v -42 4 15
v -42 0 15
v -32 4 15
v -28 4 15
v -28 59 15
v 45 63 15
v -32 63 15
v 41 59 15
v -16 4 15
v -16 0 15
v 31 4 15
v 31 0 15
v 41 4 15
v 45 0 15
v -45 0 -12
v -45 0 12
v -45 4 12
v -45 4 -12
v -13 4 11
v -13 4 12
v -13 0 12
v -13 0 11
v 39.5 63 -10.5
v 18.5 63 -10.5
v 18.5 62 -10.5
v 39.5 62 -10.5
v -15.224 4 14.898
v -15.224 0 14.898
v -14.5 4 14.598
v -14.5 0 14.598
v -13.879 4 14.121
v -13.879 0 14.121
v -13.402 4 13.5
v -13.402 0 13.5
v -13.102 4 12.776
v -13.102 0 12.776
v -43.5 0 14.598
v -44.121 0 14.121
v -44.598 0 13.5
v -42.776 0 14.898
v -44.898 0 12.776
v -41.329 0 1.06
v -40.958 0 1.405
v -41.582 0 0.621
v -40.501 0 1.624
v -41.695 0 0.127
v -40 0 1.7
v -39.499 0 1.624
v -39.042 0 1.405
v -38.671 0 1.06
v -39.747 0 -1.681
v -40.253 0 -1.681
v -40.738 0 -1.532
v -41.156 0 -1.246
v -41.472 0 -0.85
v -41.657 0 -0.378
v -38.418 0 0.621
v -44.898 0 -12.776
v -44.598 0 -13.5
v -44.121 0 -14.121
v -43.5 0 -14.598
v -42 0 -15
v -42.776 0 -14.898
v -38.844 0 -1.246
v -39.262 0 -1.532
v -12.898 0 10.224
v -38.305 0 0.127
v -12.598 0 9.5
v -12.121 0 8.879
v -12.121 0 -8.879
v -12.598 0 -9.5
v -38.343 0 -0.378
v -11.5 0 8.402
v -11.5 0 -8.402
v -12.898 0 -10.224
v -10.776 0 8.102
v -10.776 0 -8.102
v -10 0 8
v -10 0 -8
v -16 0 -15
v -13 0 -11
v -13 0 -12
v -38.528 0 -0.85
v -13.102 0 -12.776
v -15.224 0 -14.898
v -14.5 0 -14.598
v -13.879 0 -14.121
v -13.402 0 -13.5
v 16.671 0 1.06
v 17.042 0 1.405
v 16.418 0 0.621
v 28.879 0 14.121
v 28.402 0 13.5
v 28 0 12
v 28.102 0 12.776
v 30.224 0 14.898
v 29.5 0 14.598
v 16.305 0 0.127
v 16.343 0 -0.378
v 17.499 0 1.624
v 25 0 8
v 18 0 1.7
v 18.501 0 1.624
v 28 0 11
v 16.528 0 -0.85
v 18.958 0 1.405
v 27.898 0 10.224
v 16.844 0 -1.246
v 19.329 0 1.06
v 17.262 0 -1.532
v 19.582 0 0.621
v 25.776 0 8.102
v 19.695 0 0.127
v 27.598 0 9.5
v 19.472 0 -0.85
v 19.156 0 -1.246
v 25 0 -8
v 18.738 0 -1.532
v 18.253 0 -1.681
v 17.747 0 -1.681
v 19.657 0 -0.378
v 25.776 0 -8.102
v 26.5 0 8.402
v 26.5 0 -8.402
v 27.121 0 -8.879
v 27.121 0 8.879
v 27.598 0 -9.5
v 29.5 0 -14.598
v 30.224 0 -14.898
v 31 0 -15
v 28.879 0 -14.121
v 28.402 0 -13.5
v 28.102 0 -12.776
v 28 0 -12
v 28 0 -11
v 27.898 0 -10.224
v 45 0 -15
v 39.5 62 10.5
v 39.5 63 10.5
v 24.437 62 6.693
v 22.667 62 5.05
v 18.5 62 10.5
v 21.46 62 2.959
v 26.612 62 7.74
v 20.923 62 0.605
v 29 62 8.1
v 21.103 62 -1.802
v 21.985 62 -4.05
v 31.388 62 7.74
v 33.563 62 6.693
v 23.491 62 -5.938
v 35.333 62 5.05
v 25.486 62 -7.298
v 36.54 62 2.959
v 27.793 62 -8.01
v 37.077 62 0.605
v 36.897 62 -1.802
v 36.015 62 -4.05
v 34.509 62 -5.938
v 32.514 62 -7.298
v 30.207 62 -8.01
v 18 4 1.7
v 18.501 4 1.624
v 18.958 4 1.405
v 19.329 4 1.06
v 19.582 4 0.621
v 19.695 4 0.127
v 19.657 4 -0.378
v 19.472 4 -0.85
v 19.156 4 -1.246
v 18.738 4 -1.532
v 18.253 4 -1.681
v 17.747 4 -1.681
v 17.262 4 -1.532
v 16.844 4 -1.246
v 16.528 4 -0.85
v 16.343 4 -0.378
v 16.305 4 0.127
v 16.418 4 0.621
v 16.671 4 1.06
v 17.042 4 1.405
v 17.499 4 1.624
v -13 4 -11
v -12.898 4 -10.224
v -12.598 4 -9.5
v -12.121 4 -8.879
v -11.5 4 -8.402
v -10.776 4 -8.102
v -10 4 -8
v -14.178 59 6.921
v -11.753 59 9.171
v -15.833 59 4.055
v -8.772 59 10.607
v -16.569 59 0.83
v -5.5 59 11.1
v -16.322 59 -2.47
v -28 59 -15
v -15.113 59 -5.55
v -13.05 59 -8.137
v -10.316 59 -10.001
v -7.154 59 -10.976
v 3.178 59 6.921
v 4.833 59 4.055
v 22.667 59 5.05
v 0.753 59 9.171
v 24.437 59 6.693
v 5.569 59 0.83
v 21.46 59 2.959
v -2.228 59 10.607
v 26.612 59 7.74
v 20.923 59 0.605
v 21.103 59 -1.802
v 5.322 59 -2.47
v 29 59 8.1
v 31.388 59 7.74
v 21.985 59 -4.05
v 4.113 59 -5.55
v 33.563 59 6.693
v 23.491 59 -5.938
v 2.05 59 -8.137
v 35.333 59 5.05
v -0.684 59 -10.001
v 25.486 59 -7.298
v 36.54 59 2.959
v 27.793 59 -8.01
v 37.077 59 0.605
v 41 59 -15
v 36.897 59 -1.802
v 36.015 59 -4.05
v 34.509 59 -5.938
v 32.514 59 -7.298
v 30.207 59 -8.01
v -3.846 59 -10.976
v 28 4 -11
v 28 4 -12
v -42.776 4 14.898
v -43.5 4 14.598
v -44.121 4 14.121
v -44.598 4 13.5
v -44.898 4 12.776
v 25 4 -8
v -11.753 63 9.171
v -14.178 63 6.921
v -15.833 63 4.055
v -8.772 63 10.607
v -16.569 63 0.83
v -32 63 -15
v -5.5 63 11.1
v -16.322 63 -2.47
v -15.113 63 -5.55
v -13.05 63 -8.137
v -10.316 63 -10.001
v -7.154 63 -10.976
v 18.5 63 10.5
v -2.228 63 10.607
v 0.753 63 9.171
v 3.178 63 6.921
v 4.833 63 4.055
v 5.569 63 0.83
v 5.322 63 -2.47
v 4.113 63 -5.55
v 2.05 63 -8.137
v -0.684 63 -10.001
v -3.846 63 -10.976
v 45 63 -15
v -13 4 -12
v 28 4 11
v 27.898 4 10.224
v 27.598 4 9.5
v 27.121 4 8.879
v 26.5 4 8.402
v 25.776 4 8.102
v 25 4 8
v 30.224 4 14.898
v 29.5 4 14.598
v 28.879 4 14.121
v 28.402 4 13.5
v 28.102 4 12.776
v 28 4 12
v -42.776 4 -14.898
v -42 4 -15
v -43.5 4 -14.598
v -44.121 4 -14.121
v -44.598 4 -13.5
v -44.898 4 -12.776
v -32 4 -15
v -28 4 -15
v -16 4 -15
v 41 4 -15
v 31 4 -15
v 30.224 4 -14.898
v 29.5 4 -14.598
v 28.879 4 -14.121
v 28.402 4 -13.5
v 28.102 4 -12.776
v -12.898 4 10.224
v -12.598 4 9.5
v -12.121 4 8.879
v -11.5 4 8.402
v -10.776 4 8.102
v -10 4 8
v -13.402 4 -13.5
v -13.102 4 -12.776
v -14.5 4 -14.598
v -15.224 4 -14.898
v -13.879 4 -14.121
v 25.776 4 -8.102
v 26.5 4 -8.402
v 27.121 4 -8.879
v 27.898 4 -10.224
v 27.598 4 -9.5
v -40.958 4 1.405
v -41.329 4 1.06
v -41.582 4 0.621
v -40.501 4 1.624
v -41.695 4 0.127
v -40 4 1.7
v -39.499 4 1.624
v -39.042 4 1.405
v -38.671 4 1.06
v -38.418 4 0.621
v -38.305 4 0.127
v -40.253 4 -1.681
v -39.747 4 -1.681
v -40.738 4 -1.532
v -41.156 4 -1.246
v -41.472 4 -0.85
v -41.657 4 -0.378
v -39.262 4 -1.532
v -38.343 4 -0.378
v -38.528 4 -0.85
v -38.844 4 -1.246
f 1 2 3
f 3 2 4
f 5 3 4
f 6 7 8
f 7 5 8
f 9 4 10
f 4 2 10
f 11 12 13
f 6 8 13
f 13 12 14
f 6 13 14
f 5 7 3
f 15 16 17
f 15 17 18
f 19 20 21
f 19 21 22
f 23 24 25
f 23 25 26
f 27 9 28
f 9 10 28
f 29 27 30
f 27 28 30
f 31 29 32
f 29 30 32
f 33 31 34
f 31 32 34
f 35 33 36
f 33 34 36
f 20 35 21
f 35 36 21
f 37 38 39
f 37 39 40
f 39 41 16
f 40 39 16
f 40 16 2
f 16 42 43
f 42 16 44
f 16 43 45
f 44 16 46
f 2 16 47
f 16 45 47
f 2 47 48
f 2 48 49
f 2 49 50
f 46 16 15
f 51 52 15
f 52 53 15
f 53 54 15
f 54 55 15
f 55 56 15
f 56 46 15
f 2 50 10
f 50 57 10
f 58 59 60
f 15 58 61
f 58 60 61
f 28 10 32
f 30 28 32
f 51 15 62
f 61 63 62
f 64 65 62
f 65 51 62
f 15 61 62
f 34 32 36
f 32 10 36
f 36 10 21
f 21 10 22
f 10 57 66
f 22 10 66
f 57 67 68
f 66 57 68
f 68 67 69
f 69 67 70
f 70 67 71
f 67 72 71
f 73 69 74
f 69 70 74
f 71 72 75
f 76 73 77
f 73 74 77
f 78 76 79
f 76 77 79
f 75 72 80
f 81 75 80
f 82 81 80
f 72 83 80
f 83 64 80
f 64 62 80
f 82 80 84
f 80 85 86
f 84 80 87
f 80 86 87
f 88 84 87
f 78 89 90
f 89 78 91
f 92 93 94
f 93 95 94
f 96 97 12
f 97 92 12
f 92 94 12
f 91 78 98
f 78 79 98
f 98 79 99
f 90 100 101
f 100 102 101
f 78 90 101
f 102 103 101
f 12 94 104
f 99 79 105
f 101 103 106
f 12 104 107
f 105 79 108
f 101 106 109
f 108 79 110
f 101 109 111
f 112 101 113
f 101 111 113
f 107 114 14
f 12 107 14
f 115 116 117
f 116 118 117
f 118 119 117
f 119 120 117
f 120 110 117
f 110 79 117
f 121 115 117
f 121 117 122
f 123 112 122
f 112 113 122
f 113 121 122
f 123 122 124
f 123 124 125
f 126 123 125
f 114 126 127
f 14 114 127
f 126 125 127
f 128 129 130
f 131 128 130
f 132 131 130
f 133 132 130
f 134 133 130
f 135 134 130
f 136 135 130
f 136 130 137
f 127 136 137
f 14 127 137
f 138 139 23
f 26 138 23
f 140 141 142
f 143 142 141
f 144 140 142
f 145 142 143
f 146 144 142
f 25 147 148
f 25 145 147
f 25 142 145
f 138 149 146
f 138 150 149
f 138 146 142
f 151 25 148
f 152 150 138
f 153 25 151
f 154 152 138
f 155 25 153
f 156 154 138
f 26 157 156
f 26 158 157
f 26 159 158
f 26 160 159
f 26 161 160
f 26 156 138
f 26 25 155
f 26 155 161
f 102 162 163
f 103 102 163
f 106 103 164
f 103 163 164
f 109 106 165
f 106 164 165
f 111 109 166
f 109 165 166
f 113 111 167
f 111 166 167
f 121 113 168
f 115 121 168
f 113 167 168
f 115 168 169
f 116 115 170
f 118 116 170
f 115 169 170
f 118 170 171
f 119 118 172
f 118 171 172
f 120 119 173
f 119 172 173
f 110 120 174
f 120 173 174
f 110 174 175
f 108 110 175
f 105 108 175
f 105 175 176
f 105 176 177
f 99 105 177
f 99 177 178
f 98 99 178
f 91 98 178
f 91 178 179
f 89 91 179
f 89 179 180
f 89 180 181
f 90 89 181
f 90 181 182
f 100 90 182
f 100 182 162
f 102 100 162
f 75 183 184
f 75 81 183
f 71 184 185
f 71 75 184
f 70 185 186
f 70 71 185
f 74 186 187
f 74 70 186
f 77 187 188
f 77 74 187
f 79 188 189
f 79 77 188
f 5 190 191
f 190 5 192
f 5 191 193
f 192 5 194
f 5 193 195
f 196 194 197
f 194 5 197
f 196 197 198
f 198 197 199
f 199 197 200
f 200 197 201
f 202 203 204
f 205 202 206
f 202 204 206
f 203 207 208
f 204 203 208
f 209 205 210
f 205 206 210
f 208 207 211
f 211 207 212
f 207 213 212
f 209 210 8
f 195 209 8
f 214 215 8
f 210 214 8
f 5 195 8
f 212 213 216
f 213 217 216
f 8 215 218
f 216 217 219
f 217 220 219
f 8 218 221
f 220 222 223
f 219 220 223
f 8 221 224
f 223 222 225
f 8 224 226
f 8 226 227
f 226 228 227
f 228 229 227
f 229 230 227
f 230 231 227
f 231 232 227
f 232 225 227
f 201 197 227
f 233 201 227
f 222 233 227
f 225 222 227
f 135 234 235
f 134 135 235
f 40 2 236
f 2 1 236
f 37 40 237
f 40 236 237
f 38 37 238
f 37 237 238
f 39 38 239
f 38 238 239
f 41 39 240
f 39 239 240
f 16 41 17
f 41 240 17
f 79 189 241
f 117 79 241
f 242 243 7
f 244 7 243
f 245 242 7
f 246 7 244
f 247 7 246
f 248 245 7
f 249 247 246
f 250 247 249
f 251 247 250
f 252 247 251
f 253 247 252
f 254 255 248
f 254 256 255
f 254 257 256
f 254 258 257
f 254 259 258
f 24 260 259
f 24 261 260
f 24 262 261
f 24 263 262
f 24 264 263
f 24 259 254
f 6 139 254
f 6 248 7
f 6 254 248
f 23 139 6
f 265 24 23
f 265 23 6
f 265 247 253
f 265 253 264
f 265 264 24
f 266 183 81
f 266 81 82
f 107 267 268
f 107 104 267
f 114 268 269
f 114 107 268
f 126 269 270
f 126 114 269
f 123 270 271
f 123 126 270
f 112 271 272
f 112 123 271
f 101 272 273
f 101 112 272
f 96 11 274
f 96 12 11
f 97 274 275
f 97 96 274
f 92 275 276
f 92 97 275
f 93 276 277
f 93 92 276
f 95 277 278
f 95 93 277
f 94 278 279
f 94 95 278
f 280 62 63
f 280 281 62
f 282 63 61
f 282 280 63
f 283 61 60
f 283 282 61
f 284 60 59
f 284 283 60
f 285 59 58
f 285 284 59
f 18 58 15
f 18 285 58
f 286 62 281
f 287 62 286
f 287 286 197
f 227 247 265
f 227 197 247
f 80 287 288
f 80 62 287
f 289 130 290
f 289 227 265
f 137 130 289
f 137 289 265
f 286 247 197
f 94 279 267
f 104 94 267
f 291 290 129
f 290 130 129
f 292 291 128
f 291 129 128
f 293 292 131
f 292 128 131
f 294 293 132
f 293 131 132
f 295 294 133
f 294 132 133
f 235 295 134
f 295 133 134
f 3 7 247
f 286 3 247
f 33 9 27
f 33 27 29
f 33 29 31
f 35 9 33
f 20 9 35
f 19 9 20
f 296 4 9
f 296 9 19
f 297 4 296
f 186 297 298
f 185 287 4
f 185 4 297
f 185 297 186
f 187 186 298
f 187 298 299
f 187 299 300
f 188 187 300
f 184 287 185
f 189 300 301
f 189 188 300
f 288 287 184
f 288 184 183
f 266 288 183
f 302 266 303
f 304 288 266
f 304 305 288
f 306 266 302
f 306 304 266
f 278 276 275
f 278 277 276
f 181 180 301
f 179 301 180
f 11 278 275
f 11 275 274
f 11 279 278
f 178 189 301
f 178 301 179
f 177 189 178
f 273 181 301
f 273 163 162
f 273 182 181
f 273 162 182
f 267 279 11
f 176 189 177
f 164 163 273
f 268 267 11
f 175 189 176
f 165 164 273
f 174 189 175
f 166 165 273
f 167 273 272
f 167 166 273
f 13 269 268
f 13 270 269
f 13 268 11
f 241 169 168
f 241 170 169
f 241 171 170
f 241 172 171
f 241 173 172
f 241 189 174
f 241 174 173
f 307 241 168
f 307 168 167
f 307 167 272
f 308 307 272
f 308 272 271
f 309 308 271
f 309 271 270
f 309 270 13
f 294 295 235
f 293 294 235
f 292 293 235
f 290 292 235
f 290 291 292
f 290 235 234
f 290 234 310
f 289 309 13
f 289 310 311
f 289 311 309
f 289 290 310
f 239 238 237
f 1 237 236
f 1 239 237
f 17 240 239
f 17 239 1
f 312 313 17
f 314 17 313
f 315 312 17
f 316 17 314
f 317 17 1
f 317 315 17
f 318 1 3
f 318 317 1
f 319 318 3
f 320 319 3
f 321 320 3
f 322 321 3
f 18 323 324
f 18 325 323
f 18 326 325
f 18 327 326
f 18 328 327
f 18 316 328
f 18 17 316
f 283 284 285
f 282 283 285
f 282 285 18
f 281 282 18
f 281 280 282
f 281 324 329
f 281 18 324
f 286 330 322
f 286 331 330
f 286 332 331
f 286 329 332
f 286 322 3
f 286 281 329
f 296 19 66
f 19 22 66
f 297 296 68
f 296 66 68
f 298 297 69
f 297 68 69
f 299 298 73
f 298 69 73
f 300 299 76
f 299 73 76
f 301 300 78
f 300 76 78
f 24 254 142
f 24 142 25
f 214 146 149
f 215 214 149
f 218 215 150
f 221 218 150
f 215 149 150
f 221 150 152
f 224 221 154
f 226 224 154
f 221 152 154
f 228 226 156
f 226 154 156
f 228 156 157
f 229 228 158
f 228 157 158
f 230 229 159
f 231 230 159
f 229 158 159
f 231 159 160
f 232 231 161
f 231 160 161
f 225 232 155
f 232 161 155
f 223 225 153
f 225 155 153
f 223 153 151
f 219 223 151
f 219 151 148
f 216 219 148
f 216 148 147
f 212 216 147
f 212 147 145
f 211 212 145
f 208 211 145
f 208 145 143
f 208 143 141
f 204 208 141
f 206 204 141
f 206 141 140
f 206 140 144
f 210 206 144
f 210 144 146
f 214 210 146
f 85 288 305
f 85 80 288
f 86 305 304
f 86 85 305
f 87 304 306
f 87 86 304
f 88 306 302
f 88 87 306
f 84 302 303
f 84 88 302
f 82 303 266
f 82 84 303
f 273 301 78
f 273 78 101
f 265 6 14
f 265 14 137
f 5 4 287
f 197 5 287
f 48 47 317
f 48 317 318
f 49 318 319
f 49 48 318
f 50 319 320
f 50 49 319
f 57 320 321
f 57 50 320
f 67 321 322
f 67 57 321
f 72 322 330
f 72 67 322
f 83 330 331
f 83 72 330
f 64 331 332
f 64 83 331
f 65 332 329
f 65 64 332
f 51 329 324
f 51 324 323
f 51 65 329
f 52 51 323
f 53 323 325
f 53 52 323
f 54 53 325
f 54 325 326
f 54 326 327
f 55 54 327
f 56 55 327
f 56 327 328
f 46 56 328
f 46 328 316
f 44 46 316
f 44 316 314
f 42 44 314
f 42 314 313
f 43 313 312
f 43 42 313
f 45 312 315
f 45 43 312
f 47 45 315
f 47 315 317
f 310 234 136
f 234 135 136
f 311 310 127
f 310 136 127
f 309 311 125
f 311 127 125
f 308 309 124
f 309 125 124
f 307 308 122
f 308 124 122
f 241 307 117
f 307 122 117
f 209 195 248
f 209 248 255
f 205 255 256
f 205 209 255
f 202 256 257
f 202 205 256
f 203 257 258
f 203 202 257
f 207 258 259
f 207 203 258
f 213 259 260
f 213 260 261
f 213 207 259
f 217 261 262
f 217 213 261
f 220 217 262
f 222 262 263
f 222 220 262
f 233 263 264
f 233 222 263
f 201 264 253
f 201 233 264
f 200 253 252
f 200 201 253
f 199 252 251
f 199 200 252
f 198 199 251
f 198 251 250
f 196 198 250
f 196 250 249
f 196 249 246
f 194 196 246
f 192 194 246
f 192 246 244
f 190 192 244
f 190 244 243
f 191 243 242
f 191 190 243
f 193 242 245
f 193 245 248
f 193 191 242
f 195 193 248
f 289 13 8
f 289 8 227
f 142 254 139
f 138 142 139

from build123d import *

# Parameters (mm, degrees)
SKETCH_1_W          = 90
SKETCH_1_H          = 30
SKETCH_1_R          = 1.7
EXTRUDE_1_DEPTH     = 4
SKETCH_2_W          = 4
SKETCH_2_H          = 30
EXTRUDE_2_DEPTH     = 55
SKETCH_3_W          = 77
SKETCH_3_H          = 30
SKETCH_3_R          = 11.1
EXTRUDE_3_DEPTH     = 4
SKETCH_4_R          = 8.1
CUT_EXTRUDE_1_DEPTH = 4
SKETCH_5_W          = 21
SKETCH_5_H          = 21
CUT_EXTRUDE_2_DEPTH = 1
SKETCH_6_R          = 1.7
CUT_EXTRUDE_3_DEPTH = 5
SKETCH_7_W          = 41
SKETCH_7_H          = 7
CUT_EXTRUDE_4_DEPTH = 10
FILLET_1_R          = 3


with BuildPart() as part:
    # 草图1 → 凸台-拉伸1 (new body)
    with BuildSketch(Plane(origin=(0, 0, 0), x_dir=(1, 0, 0), z_dir=(0, 1, 0))):
        Rectangle(SKETCH_1_W, SKETCH_1_H)
        with Locations(Location((-40, 0, 0), (0, 0, 270))):
            Circle(SKETCH_1_R, mode=Mode.SUBTRACT)
    extrude(amount=EXTRUDE_1_DEPTH)

    # 草图2 → 凸台-拉伸2 (add)
    with BuildSketch(Plane(origin=(0, 4, 0), x_dir=(1, 0, 0), z_dir=(0, 1, 0))):
        with Locations((-30, 0)):
            Rectangle(SKETCH_2_W, SKETCH_2_H)
        with Locations((43, 0)):
            Rectangle(SKETCH_2_W, SKETCH_2_H)
    extrude(amount=EXTRUDE_2_DEPTH)

    # 草图3 → 凸台-拉伸3 (add)
    with BuildSketch(Plane(origin=(0, 59, 0), x_dir=(1, 0, 0), z_dir=(0, 1, 0))):
        with Locations((6.5, 0)):
            Rectangle(SKETCH_3_W, SKETCH_3_H)
        with Locations(Location((-5.5, 0, 0), (0, 0, 270))):
            Circle(SKETCH_3_R, mode=Mode.SUBTRACT)
    extrude(amount=EXTRUDE_3_DEPTH)

    # 草图4 → 切除-拉伸1 (cut)
    with BuildSketch(Plane(origin=(0, 63, 0), x_dir=(1, 0, 0), z_dir=(0, 1, 0))):
        with Locations(Location((29, 0, 0), (0, 0, 270))):
            Circle(SKETCH_4_R)
    extrude(amount=-CUT_EXTRUDE_1_DEPTH, mode=Mode.SUBTRACT)

    # 草图5 → 切除-拉伸2 (cut)
    with BuildSketch(Plane(origin=(0, 63, 0), x_dir=(1, 0, 0), z_dir=(0, 1, 0))):
        with Locations((29, 0)):
            Rectangle(SKETCH_5_W, SKETCH_5_H)
    extrude(amount=-CUT_EXTRUDE_2_DEPTH, mode=Mode.SUBTRACT)

    # 草图6 → 切除-拉伸3 (cut)
    with BuildSketch(Plane(origin=(0, 4, 0), x_dir=(1, 0, 0), z_dir=(0, 1, 0))):
        with Locations(Location((18, 0, 0), (0, 0, 270))):
            Circle(SKETCH_6_R)
    extrude(amount=-CUT_EXTRUDE_3_DEPTH, mode=Mode.SUBTRACT)

    # 草图7 → 切除-拉伸4 (cut)
    with BuildSketch(Plane(origin=(0, 4, 0), x_dir=(1, 0, 0), z_dir=(0, 1, 0))):
        with Locations((7.5, -11.5)):
            Rectangle(SKETCH_7_W, SKETCH_7_H)
        with Locations((7.5, 11.5)):
            Rectangle(SKETCH_7_W, SKETCH_7_H)
    extrude(amount=-CUT_EXTRUDE_4_DEPTH, mode=Mode.SUBTRACT)

    # 圆角1
    fillet_1_edges = [part.edges().sort_by_distance(p)[0] for p in [
        (28, 2, -8),
        (-13, 2, -8),
        (-45, 2, 15),
        (-45, 2, -15),
        (28, 2, 15),
        (-13, 2, 15),
        (-13, 2, -15),
        (28, 2, -15),
        (-13, 2, 8),
        (28, 2, 8),
    ]]
    fillet(fillet_1_edges, radius=FILLET_1_R)


solid = part.part
